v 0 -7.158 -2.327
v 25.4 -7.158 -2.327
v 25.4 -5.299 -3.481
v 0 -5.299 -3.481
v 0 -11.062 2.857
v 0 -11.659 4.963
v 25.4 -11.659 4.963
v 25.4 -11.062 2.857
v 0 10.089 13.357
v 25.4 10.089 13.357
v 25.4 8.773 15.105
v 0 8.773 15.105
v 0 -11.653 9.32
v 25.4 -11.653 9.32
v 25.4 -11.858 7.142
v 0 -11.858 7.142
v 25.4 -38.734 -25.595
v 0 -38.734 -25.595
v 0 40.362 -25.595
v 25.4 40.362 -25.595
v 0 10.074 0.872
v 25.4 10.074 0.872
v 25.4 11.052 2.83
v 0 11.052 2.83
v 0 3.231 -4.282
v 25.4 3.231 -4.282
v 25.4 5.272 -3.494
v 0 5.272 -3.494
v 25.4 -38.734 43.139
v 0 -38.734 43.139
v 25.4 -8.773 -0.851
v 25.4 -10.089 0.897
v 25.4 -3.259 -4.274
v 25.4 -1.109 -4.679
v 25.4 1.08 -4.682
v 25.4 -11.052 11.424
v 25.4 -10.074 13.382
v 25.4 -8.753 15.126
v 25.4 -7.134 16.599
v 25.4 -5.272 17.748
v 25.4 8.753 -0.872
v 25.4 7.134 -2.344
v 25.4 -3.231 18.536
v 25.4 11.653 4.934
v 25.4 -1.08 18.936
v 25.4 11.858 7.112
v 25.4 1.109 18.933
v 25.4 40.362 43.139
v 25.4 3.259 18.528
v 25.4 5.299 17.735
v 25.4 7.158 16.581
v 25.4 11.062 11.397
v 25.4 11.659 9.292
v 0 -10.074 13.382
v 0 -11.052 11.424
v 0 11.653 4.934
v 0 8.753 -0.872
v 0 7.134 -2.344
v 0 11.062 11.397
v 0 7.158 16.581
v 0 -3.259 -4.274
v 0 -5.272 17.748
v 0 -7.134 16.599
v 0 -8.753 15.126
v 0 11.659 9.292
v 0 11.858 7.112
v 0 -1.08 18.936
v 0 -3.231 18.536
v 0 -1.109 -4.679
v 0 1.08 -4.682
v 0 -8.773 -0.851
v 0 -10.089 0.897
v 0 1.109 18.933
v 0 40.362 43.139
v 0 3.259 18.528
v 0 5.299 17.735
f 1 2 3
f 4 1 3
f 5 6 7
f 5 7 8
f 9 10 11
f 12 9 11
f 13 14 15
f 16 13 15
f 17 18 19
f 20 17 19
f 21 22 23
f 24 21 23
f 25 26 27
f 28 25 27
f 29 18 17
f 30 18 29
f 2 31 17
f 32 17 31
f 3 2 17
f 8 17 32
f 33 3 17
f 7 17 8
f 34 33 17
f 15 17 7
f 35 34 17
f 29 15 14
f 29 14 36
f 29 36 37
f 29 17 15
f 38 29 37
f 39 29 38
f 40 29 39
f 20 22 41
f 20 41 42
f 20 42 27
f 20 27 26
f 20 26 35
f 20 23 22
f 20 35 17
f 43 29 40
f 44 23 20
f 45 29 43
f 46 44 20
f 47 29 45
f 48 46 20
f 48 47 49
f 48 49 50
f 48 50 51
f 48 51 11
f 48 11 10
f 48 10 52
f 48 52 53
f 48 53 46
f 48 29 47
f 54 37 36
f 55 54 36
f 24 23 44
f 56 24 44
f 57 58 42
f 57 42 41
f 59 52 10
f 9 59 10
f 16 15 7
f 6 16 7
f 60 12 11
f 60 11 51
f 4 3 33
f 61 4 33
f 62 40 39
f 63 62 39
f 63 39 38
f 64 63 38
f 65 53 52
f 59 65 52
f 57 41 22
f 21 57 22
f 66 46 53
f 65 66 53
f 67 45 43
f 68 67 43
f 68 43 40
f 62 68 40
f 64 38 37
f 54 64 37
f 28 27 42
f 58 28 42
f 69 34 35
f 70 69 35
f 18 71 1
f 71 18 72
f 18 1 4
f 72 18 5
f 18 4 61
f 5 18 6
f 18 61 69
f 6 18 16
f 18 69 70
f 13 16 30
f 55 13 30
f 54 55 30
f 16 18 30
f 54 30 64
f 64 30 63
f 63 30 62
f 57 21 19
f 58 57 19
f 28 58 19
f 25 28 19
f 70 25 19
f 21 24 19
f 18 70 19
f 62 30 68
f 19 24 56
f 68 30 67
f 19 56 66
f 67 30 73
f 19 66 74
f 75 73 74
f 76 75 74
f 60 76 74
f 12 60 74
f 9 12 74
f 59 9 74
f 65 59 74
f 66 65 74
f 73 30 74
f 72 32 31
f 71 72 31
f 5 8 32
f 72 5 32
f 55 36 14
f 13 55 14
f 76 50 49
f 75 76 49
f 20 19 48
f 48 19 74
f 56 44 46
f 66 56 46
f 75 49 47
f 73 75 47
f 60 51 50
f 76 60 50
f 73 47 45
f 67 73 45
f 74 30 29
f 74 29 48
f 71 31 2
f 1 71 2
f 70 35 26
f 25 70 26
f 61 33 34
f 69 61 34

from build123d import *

# Parameters (mm, degrees)
F0_W     = 79.0956
F0_H     = 68.733474
F1_DEPTH = 25.4
F3_DEPTH = 25.4


with BuildPart() as f1:
    # F0 (on Right) → F1 (new body)
    with BuildSketch(Plane.YZ):
        with Locations((0.813765, 8.772184)):
            Rectangle(F0_W, F0_H)
    extrude(amount=F1_DEPTH)

    # F2 (on face) → F3 (cut)
    with BuildSketch(Plane.YZ.offset(25.4)):
        Polygon((8.753214, -0.872302), (10.074051, 0.872302), (11.051828, 2.829902), (11.653248, 4.933838), (11.85783, 7.11246), (11.658609, 9.291579), (11.062367, 11.396987), (10.08941, 13.356988), (8.77287, 15.104836), (7.157581, 16.581009), (5.298549, 17.73524), (3.259081, 18.528221), (1.108629, 18.932949), (-1.079577, 18.935641), (-3.231018, 18.536206), (-5.272431, 17.748245), (-7.134298, 16.598592), (-8.753214, 15.126397), (-10.074051, 13.381794), (-11.051828, 11.424194), (-11.653248, 9.320258), (-11.85783, 7.141636), (-11.658609, 4.962517), (-11.062367, 2.857109), (-10.08941, 0.897108), (-8.77287, -0.85074), (-7.157581, -2.326914), (-5.298549, -3.481144), (-3.259081, -4.274125), (-1.108629, -4.678853), (1.079577, -4.681545), (3.231018, -4.28211), (5.272431, -3.494149), (7.134298, -2.344496), align=None)
    extrude(amount=-F3_DEPTH, mode=Mode.SUBTRACT)


solid = f1.part
